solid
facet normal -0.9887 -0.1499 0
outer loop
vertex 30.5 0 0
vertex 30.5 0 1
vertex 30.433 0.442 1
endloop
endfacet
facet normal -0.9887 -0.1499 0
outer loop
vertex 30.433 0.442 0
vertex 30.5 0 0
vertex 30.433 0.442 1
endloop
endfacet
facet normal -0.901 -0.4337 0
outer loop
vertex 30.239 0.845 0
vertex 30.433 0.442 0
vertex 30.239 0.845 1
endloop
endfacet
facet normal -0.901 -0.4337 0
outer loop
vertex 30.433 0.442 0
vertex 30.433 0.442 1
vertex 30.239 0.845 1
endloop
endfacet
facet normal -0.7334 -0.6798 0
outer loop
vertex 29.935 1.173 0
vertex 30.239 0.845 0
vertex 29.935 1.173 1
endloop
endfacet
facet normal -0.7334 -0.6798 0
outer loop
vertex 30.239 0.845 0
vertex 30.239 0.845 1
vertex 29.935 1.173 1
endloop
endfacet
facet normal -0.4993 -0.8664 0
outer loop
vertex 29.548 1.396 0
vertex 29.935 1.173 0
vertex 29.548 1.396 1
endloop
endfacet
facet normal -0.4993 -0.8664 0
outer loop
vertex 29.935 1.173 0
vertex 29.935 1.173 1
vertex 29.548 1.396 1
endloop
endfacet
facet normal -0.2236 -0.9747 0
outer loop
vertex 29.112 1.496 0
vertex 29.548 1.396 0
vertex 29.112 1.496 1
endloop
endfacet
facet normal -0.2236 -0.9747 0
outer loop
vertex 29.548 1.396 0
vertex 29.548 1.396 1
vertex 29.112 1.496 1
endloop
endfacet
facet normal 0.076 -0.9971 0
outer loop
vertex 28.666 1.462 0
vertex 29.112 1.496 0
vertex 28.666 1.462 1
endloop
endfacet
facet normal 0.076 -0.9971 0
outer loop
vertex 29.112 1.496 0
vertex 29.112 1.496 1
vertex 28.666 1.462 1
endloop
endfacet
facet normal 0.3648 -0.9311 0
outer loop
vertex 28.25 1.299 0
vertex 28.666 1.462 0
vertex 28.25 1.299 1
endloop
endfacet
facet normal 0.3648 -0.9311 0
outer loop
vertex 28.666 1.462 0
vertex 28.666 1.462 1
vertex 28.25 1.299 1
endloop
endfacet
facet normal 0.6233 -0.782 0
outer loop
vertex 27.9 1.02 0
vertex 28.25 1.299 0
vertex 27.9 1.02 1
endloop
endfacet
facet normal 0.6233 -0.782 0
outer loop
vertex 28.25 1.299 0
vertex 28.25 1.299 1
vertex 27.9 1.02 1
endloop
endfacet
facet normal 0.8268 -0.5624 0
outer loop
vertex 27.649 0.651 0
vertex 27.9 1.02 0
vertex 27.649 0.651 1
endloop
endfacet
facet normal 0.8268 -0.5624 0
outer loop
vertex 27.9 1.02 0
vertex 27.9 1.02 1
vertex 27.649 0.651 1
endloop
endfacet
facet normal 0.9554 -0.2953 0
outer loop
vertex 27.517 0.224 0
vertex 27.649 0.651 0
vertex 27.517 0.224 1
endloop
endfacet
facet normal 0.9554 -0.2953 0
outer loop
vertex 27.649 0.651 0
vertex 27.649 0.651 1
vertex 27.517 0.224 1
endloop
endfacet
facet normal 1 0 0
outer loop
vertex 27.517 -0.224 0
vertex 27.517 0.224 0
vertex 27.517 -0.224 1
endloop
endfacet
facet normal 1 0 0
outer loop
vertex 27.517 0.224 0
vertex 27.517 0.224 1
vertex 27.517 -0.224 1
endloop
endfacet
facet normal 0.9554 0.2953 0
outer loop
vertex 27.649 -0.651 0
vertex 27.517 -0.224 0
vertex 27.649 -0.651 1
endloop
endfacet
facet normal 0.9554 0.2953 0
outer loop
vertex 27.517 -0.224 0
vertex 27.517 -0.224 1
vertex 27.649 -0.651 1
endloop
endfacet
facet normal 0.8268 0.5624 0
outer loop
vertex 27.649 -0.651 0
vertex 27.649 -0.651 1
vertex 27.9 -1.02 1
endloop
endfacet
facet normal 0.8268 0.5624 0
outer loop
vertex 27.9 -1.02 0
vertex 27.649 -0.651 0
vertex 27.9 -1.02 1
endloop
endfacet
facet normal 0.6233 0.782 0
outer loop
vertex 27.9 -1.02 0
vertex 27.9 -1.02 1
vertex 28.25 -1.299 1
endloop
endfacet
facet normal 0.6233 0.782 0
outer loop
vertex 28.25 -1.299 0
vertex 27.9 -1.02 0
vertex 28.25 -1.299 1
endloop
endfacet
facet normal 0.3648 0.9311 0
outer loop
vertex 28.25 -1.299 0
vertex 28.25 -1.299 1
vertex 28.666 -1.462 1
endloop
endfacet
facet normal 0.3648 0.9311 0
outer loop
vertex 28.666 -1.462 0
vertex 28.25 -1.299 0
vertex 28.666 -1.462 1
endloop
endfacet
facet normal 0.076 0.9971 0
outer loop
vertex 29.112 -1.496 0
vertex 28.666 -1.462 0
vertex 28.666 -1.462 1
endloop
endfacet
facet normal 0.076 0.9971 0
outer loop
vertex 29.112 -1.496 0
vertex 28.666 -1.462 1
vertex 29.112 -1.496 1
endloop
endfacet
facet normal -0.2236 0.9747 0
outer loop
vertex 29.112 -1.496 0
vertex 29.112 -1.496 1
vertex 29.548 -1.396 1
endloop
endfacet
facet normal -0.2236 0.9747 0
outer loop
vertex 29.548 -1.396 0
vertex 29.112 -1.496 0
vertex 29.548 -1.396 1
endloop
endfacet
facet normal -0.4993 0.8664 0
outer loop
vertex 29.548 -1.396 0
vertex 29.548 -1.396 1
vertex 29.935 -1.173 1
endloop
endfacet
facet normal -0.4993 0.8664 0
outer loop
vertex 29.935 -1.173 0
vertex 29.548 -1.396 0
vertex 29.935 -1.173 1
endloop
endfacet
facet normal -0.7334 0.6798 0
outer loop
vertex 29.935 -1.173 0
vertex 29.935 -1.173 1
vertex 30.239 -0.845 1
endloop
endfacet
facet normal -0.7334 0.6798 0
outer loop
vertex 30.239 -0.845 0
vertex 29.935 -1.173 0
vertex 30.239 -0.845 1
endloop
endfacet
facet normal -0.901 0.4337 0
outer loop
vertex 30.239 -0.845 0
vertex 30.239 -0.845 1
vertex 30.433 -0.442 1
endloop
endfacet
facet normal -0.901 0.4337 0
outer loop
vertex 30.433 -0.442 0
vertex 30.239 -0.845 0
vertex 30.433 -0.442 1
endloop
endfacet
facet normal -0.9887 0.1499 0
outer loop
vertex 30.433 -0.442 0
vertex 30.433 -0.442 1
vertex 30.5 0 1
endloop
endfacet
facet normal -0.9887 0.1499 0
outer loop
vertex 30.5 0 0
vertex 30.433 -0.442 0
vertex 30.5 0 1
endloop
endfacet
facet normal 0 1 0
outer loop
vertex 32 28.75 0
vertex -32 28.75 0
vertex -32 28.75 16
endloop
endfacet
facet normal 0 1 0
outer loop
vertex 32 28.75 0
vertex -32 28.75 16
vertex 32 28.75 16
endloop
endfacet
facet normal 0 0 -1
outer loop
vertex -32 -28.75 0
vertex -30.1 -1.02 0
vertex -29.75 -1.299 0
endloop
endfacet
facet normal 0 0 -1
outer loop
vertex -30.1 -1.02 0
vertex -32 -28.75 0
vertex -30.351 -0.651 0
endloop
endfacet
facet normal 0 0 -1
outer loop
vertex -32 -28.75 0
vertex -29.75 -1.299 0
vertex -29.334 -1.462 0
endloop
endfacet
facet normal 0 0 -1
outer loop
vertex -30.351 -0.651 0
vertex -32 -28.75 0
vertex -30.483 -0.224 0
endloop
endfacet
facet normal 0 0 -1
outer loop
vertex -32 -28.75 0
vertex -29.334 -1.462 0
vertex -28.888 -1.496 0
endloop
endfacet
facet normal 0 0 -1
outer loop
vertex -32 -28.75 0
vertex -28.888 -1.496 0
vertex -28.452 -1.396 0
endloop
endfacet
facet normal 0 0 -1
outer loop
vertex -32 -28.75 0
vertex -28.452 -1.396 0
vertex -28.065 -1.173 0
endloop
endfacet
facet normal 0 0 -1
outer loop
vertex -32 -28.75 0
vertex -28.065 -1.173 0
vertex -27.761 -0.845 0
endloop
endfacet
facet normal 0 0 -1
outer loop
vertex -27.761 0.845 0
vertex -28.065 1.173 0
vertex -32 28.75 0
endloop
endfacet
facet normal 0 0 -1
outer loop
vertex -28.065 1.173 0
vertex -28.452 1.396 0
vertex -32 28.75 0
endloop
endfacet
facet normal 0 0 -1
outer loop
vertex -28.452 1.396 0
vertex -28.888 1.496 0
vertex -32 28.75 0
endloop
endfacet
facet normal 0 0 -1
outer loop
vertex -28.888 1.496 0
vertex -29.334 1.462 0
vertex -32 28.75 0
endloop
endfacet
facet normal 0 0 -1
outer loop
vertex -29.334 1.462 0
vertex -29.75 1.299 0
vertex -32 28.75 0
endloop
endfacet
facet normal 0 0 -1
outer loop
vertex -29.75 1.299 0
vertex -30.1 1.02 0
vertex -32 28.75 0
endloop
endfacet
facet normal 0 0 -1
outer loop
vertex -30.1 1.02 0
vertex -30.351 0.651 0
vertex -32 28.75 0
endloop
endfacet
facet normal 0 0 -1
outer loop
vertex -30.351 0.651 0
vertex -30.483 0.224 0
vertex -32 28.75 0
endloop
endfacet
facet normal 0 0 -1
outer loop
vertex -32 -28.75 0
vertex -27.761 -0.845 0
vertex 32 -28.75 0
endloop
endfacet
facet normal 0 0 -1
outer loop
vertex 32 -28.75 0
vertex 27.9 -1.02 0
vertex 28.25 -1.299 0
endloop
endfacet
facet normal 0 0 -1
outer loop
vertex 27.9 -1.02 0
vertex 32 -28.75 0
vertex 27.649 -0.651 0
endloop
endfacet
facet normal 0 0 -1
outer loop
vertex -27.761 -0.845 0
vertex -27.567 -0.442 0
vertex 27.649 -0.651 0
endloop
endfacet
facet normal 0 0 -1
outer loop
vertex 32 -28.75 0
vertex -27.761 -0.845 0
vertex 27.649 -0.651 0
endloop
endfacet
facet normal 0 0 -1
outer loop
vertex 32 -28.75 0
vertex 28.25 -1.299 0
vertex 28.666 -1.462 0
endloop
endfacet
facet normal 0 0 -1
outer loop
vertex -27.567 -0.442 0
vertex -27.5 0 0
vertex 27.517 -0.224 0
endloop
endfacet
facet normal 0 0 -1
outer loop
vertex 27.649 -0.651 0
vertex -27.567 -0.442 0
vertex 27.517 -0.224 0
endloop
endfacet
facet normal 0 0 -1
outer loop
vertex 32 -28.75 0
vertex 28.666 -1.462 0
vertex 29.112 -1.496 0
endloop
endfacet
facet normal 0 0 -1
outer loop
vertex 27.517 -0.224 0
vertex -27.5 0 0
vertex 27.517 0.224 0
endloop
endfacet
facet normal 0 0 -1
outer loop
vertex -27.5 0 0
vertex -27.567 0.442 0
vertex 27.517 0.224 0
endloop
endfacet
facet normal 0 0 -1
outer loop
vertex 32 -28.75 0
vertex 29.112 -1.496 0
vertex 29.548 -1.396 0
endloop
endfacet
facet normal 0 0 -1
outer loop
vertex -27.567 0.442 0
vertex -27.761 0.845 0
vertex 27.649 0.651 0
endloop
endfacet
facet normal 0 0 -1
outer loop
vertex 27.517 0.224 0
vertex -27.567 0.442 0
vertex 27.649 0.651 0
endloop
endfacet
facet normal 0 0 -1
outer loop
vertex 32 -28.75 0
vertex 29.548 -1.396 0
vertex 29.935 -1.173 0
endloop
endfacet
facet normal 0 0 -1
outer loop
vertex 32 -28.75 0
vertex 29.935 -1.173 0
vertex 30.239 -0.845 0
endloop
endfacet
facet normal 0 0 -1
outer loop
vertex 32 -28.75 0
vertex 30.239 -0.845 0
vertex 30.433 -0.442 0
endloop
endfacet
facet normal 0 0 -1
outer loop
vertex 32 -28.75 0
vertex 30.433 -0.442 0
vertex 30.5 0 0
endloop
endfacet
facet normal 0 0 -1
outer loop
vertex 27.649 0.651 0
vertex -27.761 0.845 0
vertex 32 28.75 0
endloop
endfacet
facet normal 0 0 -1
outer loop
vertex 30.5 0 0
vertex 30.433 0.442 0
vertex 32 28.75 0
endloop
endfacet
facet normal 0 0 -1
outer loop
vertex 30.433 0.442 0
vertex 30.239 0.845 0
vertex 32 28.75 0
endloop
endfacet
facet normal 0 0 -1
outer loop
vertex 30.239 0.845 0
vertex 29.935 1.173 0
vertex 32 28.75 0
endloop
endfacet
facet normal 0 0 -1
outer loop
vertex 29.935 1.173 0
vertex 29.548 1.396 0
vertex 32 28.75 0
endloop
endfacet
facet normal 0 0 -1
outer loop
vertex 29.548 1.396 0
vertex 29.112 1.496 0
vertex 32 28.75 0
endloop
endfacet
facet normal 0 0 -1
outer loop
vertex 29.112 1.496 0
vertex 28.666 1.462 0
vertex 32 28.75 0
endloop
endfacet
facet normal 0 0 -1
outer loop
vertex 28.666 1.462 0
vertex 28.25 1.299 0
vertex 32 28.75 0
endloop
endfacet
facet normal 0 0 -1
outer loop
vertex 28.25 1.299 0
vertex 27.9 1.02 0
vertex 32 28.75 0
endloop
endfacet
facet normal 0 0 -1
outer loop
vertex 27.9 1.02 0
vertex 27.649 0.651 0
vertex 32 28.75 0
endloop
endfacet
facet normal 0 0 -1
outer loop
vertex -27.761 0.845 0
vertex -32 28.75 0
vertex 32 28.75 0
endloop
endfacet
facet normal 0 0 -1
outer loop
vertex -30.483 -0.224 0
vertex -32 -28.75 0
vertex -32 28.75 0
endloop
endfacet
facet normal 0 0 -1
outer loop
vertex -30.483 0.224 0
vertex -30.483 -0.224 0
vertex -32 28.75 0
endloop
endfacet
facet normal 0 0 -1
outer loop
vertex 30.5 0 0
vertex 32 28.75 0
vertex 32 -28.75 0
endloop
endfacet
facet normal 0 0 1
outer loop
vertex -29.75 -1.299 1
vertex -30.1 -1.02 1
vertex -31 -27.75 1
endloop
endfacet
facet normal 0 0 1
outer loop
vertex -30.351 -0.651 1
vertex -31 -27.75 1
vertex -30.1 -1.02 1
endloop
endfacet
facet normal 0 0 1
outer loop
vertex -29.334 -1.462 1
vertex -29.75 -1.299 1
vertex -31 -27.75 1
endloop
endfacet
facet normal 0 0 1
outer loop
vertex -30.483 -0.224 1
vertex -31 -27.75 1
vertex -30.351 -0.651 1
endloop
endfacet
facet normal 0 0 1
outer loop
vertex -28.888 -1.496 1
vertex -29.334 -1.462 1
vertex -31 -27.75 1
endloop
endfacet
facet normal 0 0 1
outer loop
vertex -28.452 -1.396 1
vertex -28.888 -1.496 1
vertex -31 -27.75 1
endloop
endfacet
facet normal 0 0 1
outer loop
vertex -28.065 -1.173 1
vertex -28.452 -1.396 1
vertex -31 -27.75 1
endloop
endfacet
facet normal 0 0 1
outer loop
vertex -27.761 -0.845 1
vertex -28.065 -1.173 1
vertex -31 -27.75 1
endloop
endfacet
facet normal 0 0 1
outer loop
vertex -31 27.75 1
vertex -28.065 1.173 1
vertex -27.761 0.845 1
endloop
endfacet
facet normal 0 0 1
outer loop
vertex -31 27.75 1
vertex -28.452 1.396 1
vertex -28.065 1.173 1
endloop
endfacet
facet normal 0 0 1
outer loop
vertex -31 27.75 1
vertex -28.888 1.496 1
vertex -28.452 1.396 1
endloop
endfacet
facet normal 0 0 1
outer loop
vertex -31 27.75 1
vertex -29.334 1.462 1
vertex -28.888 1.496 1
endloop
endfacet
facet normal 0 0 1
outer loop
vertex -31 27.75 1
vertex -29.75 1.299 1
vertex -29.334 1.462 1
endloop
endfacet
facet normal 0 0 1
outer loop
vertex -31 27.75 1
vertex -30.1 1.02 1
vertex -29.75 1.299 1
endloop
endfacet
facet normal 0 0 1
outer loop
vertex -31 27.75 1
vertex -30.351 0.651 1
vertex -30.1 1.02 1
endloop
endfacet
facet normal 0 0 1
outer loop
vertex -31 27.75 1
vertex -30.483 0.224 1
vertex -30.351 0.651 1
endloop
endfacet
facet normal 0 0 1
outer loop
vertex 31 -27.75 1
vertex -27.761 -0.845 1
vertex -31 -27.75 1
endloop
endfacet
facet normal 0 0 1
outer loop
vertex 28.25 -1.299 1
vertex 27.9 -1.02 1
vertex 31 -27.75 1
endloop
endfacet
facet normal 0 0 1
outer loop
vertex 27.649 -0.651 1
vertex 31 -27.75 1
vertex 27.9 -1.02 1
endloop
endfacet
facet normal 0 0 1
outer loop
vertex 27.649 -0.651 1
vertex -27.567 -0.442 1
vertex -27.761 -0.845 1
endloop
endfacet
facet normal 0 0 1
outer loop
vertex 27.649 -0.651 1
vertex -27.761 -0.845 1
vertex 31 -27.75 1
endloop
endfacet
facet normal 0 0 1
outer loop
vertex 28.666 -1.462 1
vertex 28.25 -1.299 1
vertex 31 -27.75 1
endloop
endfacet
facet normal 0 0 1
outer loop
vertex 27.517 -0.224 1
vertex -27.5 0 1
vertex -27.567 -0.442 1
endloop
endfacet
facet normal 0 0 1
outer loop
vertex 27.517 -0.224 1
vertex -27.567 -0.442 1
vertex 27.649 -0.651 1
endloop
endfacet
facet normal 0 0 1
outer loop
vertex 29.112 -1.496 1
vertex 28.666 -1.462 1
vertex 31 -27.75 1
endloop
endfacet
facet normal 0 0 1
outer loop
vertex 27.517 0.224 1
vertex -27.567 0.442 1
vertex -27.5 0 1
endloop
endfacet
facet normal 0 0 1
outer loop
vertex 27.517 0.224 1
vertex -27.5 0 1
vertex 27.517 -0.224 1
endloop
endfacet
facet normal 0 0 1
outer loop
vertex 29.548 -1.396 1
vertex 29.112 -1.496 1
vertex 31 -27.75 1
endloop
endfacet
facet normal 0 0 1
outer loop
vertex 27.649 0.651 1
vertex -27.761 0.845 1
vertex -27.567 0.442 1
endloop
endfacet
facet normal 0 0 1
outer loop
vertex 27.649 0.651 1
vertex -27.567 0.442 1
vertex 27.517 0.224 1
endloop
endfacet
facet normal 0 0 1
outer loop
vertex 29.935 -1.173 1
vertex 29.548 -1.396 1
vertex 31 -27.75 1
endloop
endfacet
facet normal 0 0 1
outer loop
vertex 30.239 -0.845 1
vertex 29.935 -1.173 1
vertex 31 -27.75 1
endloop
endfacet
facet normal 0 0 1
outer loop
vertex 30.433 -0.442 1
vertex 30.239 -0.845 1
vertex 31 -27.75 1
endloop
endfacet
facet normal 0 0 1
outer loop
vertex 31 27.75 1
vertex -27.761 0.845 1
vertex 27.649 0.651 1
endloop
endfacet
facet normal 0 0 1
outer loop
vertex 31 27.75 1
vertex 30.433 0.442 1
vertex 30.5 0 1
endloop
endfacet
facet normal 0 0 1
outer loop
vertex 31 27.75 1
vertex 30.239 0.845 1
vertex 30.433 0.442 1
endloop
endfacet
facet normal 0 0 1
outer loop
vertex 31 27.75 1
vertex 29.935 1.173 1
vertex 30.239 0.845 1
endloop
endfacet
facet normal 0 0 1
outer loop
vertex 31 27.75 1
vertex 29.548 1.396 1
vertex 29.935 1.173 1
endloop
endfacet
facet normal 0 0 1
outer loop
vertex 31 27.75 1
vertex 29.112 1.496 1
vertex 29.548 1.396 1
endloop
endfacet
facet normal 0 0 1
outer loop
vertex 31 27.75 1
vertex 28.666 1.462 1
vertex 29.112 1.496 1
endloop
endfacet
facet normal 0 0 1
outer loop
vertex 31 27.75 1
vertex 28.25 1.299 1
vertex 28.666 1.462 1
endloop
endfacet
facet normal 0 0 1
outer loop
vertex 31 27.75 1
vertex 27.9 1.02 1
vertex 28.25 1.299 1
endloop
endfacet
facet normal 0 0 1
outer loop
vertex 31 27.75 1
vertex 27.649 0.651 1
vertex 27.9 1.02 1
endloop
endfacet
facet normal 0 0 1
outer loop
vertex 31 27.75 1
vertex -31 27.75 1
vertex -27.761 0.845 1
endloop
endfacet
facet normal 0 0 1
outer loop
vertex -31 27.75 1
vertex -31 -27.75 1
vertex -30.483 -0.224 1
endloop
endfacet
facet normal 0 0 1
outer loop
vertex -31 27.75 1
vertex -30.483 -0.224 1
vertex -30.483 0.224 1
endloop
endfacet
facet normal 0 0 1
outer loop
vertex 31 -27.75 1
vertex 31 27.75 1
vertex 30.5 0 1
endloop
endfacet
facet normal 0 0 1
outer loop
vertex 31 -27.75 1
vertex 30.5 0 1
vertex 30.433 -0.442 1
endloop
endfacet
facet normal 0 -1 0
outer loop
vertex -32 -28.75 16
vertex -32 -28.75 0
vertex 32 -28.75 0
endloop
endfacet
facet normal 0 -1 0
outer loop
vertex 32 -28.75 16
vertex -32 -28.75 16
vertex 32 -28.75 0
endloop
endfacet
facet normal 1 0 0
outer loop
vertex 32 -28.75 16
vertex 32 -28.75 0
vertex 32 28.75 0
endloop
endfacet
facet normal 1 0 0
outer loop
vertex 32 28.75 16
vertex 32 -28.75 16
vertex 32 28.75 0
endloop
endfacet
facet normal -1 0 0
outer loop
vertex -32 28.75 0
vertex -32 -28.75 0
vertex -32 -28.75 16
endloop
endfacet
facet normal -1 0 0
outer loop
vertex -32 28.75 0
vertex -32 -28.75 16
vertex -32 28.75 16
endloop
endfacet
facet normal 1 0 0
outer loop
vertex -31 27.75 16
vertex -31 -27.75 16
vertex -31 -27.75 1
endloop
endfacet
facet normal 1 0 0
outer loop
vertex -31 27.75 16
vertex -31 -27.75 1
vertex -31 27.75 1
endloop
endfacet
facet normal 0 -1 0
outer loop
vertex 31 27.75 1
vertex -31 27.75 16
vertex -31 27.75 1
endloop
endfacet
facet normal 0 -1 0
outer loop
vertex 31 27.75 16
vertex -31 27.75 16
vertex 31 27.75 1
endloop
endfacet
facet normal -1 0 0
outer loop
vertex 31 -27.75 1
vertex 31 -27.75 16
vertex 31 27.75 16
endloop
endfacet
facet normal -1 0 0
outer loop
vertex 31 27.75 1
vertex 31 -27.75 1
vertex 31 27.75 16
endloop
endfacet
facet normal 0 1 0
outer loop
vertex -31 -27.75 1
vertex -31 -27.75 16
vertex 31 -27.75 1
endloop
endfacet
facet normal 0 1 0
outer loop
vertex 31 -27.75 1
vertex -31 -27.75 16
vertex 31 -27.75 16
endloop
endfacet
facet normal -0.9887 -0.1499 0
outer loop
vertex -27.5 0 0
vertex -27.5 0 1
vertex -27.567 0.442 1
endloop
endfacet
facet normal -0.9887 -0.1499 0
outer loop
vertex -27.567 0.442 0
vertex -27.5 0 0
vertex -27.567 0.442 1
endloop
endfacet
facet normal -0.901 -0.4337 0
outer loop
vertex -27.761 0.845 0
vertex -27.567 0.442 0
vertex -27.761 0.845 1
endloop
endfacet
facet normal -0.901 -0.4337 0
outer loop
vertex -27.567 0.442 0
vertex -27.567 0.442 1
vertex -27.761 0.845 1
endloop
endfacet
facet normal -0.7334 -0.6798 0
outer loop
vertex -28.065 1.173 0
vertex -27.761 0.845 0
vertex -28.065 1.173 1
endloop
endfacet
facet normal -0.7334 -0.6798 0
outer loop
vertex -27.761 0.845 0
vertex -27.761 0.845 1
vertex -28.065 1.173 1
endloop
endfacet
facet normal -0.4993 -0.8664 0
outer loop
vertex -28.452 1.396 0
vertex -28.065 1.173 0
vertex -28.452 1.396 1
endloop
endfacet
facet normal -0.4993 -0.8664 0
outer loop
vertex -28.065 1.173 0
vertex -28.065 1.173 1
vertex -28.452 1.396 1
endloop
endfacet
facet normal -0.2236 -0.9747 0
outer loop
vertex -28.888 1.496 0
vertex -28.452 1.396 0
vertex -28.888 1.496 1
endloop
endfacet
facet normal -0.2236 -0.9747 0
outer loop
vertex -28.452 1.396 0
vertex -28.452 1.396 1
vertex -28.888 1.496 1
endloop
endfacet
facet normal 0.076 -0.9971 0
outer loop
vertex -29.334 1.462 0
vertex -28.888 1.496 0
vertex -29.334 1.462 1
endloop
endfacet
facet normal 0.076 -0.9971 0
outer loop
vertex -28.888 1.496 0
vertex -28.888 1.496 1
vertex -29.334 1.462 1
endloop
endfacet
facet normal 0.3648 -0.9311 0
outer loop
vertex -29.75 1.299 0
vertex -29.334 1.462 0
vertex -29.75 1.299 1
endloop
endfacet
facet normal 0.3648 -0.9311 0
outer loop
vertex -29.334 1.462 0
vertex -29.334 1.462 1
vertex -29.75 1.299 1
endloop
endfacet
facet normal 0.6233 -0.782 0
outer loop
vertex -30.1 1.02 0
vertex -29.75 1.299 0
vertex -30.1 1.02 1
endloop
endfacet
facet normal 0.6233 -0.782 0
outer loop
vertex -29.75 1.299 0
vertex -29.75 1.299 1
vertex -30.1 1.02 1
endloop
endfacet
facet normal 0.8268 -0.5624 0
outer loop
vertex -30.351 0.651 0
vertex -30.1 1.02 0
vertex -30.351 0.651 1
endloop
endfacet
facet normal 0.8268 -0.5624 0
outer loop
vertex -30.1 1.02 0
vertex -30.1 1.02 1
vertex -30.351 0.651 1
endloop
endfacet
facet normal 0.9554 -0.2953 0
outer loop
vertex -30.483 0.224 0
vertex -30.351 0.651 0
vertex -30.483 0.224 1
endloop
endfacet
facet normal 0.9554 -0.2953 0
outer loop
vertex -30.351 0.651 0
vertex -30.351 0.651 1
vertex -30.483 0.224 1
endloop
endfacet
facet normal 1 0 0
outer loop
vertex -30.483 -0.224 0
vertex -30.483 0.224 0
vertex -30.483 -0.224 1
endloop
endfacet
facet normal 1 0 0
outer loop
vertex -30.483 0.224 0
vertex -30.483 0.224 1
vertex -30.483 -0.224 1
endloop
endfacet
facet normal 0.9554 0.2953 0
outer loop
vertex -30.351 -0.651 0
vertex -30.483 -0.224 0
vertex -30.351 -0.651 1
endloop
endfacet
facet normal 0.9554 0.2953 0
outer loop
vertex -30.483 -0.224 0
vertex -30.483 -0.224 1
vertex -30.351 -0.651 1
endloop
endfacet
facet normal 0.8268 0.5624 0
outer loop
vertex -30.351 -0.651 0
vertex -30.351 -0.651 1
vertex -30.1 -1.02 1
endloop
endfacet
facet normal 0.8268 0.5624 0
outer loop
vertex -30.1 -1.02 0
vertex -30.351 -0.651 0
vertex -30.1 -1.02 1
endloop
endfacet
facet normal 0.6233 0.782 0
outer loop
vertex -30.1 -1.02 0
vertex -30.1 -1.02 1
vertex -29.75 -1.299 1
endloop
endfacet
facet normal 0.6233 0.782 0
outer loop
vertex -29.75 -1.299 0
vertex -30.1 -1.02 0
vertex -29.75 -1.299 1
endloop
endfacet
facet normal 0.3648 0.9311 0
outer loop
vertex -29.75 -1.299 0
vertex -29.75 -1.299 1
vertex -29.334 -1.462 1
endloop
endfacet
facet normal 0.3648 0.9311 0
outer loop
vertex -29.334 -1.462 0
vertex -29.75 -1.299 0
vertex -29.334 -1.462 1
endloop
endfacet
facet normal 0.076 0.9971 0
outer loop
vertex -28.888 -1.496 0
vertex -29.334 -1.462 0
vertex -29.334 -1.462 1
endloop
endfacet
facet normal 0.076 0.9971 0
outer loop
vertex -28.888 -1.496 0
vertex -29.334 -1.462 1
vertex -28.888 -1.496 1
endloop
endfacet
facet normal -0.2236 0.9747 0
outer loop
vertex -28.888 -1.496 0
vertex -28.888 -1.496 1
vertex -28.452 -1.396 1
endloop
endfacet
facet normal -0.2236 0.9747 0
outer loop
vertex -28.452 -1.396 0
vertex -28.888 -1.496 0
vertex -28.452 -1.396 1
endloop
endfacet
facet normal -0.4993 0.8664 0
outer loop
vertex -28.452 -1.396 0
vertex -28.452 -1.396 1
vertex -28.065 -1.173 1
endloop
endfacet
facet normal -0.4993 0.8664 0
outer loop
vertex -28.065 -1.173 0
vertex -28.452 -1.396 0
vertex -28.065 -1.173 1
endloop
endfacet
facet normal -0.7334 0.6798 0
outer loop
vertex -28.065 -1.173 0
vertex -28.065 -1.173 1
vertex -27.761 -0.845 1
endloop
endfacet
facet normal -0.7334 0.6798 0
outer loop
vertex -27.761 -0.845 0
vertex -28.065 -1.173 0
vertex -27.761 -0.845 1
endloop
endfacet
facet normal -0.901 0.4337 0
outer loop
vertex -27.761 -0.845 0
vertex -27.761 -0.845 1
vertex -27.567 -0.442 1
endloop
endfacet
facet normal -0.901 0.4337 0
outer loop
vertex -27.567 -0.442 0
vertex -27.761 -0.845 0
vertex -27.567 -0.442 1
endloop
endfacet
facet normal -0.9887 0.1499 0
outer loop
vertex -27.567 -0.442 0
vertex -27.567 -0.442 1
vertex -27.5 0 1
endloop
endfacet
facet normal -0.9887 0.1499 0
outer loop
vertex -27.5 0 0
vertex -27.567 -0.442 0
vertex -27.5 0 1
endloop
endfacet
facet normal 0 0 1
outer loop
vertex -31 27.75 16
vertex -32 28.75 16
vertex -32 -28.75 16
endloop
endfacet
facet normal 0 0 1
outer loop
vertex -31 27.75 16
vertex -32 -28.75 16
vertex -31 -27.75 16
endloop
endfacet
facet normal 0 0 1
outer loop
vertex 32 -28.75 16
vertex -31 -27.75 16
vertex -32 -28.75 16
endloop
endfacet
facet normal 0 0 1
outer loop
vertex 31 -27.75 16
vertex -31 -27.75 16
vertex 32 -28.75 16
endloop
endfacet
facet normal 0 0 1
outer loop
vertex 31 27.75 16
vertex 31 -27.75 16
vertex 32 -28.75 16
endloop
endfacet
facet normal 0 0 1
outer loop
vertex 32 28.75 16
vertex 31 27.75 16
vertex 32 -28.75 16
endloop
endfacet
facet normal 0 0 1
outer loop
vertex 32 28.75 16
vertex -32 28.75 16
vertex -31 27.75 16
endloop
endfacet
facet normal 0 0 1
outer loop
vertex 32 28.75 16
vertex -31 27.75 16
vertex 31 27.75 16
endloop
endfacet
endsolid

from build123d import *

# Parameters (mm, degrees)
SKETCH001_W     = 64
SKETCH001_H     = 57.5
PAD_DEPTH       = 16
SKETCH003_W     = 62
SKETCH003_H     = 55.5
POCKET001_DEPTH = 15
SKETCH002_R     = 1.5
POCKET_DEPTH    = 16.001


with BuildPart() as part:
    # Sketch001 → Pad (new body)
    with BuildSketch(Plane.XY):
        Rectangle(SKETCH001_W, SKETCH001_H)
    extrude(amount=PAD_DEPTH)

    # Sketch003 (on Face6 of Pad) → Pocket001 (cut)
    with BuildSketch(Plane.XY.offset(16)):
        Rectangle(SKETCH003_W, SKETCH003_H)
    extrude(amount=-POCKET001_DEPTH, mode=Mode.SUBTRACT)

    # Sketch002 (on Face6 of Pad) → Pocket (cut, through all)
    with BuildSketch(Plane.XY.offset(16)):
        with Locations((-29, 0)):
            Circle(SKETCH002_R)
        with Locations((29, 0)):
            Circle(SKETCH002_R)
    extrude(amount=-POCKET_DEPTH, mode=Mode.SUBTRACT)


solid = part.part
